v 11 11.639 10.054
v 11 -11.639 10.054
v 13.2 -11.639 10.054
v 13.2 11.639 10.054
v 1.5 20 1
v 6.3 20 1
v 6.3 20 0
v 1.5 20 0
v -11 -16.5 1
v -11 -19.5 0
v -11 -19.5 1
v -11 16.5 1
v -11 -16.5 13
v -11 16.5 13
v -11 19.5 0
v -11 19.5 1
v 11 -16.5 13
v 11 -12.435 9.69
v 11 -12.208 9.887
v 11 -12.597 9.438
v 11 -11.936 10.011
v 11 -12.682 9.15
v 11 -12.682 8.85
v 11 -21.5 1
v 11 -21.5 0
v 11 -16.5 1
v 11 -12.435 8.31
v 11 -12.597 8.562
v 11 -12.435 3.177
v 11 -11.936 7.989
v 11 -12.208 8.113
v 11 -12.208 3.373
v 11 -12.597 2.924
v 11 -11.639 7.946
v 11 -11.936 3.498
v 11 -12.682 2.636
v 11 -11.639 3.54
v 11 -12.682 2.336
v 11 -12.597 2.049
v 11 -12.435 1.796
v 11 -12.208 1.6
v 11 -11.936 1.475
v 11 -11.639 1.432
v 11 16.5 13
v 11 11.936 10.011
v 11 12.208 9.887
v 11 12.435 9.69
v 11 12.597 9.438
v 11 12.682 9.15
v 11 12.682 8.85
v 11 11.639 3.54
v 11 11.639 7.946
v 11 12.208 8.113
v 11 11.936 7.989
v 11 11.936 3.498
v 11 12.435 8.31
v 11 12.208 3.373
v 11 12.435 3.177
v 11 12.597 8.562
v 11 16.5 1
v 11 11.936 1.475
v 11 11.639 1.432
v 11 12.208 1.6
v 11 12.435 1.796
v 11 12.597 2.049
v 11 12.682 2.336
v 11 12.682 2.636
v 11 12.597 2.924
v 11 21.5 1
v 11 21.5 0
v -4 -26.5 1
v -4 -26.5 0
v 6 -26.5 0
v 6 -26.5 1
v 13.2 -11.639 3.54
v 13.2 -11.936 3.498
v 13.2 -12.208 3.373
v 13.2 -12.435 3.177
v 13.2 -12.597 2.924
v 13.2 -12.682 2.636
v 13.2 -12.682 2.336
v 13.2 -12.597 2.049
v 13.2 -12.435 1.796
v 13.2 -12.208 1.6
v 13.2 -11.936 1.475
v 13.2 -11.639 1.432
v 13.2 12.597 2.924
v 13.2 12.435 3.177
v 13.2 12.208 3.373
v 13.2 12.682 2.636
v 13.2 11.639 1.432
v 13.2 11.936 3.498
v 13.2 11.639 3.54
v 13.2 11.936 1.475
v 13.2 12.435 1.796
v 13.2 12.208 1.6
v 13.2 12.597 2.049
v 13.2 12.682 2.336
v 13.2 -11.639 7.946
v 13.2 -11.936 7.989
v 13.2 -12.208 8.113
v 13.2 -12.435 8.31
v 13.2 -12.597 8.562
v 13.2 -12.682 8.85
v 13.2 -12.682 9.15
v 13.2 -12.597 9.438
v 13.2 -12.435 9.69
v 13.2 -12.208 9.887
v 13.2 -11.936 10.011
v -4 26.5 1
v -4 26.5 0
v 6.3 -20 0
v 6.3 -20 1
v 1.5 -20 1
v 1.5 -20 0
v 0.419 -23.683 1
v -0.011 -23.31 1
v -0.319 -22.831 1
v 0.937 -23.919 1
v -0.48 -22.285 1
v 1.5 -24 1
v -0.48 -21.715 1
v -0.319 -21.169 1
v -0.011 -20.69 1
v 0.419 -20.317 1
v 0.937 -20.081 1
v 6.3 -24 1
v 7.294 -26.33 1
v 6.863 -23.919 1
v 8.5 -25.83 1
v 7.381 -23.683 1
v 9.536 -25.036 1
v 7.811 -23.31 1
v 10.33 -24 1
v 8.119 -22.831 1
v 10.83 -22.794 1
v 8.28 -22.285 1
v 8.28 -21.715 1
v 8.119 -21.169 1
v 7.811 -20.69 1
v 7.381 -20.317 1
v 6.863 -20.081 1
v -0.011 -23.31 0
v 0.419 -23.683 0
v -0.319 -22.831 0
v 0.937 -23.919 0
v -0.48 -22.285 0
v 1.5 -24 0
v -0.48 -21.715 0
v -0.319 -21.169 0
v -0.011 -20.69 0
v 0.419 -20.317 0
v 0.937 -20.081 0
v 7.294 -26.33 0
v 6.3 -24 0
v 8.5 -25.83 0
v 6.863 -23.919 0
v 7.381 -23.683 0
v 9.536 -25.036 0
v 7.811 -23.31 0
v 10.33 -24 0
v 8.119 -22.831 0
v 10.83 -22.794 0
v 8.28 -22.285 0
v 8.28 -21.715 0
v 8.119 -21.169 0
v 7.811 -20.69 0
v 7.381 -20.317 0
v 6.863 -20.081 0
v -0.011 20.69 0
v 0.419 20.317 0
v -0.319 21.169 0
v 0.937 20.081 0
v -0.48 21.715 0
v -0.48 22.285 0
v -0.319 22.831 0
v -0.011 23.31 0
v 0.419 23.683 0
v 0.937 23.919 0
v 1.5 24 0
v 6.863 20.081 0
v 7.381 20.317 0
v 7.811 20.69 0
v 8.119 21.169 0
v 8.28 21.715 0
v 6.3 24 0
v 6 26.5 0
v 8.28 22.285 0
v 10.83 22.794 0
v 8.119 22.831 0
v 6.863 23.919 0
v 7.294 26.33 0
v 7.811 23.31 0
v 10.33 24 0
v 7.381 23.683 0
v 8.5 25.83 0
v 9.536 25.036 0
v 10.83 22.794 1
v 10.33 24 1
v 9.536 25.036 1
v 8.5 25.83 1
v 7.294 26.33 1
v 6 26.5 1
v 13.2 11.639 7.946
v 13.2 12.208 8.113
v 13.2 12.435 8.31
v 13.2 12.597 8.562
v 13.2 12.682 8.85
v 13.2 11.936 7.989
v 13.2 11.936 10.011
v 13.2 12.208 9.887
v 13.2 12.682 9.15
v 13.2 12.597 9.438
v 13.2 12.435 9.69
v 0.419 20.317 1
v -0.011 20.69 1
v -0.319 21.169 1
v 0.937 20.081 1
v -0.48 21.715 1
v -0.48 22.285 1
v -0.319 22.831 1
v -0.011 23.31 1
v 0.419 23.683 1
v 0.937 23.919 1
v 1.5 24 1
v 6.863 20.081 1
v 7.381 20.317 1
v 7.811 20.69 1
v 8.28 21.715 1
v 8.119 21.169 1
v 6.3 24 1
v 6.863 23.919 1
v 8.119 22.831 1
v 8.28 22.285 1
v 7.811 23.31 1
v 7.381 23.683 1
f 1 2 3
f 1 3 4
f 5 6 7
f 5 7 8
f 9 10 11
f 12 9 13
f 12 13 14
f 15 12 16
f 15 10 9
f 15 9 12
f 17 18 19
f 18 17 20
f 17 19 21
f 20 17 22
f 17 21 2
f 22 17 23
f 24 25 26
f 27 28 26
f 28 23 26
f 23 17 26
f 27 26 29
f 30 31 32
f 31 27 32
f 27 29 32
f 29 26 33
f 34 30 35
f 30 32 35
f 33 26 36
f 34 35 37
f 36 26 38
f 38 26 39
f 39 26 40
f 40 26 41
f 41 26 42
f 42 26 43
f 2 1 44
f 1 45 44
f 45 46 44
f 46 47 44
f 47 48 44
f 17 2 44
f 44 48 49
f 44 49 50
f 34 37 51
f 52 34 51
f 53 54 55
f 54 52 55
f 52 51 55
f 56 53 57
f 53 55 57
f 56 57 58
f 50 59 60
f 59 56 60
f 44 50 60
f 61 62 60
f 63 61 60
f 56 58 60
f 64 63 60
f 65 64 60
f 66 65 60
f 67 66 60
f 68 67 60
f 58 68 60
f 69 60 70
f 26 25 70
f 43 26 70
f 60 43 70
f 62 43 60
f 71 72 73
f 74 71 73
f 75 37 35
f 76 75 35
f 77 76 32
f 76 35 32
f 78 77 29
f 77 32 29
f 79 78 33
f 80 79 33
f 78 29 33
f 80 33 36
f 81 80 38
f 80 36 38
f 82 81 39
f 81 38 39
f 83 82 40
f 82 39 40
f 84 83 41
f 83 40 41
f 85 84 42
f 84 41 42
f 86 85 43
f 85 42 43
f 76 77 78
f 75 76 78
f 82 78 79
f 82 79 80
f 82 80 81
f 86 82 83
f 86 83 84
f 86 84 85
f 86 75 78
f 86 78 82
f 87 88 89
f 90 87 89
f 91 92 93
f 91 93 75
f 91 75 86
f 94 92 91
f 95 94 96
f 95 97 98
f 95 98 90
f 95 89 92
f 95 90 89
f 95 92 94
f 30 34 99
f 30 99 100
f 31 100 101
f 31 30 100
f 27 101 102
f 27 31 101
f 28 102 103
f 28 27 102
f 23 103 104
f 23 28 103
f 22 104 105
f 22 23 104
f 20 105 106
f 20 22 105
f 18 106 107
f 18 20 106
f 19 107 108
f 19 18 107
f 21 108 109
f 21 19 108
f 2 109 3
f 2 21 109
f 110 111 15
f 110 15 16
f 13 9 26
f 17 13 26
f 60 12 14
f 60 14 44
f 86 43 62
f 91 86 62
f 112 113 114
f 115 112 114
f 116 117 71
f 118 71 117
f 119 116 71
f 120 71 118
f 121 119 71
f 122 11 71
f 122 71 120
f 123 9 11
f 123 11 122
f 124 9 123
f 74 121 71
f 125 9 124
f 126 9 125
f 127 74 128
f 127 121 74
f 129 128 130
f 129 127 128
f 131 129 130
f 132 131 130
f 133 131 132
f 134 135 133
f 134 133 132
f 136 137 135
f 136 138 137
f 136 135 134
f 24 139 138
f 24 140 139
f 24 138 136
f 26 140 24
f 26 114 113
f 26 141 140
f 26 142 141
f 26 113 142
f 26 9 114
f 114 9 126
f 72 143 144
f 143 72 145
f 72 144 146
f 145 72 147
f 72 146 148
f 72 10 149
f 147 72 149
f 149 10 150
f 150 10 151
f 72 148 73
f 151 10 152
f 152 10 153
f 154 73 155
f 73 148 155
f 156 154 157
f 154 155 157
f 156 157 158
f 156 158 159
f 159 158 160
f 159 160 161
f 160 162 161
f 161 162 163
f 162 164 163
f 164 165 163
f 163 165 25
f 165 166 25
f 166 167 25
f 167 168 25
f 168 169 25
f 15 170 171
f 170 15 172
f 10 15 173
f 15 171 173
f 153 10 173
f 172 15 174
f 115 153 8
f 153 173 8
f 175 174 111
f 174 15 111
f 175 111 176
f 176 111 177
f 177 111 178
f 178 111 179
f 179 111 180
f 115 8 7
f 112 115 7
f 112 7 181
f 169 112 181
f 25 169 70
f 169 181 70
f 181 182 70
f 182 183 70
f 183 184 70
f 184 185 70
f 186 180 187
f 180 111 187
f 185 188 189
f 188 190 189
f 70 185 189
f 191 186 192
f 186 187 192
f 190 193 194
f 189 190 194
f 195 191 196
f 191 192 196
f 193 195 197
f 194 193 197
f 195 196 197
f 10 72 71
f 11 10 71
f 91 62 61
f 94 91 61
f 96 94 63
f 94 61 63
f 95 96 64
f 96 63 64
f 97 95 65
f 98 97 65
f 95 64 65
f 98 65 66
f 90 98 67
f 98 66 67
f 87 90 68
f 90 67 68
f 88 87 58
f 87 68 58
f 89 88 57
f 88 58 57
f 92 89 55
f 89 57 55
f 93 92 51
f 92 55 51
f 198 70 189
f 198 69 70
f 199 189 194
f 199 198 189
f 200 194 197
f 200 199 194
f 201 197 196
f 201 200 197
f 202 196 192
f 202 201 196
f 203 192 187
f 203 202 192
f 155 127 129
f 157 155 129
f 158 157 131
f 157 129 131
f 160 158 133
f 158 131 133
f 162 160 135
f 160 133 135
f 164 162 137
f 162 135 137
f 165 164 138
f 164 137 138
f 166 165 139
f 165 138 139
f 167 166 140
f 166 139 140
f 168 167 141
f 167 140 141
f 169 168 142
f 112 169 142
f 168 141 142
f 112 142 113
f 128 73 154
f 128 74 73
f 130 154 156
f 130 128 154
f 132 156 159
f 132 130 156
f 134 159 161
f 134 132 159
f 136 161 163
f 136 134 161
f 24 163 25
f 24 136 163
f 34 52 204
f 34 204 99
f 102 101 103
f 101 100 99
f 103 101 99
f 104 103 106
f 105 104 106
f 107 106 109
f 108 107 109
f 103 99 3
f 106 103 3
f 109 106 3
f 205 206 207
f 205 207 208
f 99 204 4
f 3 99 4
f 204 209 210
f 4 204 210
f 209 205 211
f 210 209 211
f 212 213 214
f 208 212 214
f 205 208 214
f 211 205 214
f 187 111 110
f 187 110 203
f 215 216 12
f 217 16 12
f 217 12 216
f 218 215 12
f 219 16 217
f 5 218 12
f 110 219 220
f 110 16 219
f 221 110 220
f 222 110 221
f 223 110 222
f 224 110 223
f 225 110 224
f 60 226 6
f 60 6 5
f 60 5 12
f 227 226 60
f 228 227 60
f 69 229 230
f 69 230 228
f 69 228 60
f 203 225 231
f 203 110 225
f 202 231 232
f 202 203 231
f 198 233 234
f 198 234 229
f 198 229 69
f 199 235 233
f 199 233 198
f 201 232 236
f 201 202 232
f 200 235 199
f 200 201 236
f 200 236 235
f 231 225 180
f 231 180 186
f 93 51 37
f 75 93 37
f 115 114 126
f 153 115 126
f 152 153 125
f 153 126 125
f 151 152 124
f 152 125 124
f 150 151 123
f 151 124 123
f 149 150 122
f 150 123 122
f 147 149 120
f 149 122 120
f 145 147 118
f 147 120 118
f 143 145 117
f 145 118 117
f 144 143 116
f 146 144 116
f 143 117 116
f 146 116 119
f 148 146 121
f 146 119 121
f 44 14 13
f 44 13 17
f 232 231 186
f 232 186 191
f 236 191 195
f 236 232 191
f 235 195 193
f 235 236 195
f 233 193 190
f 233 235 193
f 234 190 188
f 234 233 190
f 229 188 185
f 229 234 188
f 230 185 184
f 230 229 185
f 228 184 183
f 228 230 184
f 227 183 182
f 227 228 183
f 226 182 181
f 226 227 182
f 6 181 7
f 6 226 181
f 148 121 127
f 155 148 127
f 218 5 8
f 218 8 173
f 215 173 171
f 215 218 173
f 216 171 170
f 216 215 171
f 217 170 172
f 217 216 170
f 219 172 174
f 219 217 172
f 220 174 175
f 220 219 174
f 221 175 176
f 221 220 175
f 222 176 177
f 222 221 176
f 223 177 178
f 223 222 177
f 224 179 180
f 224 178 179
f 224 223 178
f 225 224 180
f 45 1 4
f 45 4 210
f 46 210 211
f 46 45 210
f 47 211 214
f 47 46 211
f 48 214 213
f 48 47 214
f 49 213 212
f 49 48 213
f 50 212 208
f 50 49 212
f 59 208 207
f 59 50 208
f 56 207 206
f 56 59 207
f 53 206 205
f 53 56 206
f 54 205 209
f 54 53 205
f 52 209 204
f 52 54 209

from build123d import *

# Parameters (mm, degrees)
SKETCH_1_W          = 22
SKETCH_1_H          = 53
EXTRUDE_1_DEPTH     = 1
CUT_EXTRUDE_1_DEPTH = 29.70975444
SKETCH_3_W          = 22
SKETCH_3_H          = 33
EXTRUDE_2_DEPTH     = 12
EXTRUDE_3_DEPTH     = 2.2
CHAMFER_1_SIZE      = 7
FILLET_1_R          = 5


with BuildPart() as part:
    # 草图1 → 凸台-拉伸1 (new body)
    with BuildSketch(Plane.XY):
        Rectangle(SKETCH_1_W, SKETCH_1_H)
    extrude(amount=EXTRUDE_1_DEPTH)

    # 草图2 → 切除-拉伸1 (cut, through all)
    with BuildSketch(Plane.XY.offset(1)):
        with BuildLine():
            Line((1.5, 24), (6.3, 24))
            ThreePointArc((6.3, 24), (8.3, 22), (6.3, 20))
            Line((6.3, 20), (1.5, 20))
            ThreePointArc((1.5, 20), (-0.5, 22), (1.5, 24))
        make_face()
    cut_extrude_1 = extrude(amount=-CUT_EXTRUDE_1_DEPTH, mode=Mode.SUBTRACT)

    # 镜向1: 切除-拉伸1 across plane
    add(cut_extrude_1.mirror(Plane.ZX), mode=Mode.SUBTRACT)

    # 草图3 → 凸台-拉伸2 (add)
    with BuildSketch(Plane.XY.offset(1)):
        Rectangle(SKETCH_3_W, SKETCH_3_H)
    extrude(amount=EXTRUDE_2_DEPTH)

    # 草图4 → 凸台-拉伸3 (add)
    with BuildSketch(Plane(origin=(11, 0, 0), x_dir=(0, 0, -1), z_dir=(1, 0, 0))):
        with BuildLine():
            Line((-10.054063842, -11.63862159), (-10.054063842, 11.63862159))
            ThreePointArc((-10.054063842, 11.63862159), (-9, 12.692685432), (-7.945936158, 11.63862159))
            Line((-7.945936158, 11.63862159), (-7.945936158, -11.63862159))
            ThreePointArc((-7.945936158, -11.63862159), (-9, -12.692685432), (-10.054063842, -11.63862159))
        make_face()
        with BuildLine():
            Line((-1.432333752, -11.63862159), (-1.432333752, 11.63862159))
            ThreePointArc((-1.432333752, 11.63862159), (-2.486397594, 12.692685432), (-3.540461436, 11.63862159))
            Line((-3.540461436, 11.63862159), (-3.540461436, -11.63862159))
            ThreePointArc((-3.540461436, -11.63862159), (-2.486397594, -12.692685432), (-1.432333752, -11.63862159))
        make_face()
    extrude(amount=EXTRUDE_3_DEPTH)

    # 倒角1
    chamfer_1_edges = [part.edges().sort_by_distance(p)[0] for p in [
        (-11, -26.5, 0.5),
        (-11, 26.5, 0.5),
    ]]
    chamfer(chamfer_1_edges, length=CHAMFER_1_SIZE)

    # 圆角1
    fillet_1_edges = [part.edges().sort_by_distance(p)[0] for p in [
        (11, -26.5, 0.5),
        (11, 26.5, 0.5),
    ]]
    fillet(fillet_1_edges, radius=FILLET_1_R)


solid = part.part
